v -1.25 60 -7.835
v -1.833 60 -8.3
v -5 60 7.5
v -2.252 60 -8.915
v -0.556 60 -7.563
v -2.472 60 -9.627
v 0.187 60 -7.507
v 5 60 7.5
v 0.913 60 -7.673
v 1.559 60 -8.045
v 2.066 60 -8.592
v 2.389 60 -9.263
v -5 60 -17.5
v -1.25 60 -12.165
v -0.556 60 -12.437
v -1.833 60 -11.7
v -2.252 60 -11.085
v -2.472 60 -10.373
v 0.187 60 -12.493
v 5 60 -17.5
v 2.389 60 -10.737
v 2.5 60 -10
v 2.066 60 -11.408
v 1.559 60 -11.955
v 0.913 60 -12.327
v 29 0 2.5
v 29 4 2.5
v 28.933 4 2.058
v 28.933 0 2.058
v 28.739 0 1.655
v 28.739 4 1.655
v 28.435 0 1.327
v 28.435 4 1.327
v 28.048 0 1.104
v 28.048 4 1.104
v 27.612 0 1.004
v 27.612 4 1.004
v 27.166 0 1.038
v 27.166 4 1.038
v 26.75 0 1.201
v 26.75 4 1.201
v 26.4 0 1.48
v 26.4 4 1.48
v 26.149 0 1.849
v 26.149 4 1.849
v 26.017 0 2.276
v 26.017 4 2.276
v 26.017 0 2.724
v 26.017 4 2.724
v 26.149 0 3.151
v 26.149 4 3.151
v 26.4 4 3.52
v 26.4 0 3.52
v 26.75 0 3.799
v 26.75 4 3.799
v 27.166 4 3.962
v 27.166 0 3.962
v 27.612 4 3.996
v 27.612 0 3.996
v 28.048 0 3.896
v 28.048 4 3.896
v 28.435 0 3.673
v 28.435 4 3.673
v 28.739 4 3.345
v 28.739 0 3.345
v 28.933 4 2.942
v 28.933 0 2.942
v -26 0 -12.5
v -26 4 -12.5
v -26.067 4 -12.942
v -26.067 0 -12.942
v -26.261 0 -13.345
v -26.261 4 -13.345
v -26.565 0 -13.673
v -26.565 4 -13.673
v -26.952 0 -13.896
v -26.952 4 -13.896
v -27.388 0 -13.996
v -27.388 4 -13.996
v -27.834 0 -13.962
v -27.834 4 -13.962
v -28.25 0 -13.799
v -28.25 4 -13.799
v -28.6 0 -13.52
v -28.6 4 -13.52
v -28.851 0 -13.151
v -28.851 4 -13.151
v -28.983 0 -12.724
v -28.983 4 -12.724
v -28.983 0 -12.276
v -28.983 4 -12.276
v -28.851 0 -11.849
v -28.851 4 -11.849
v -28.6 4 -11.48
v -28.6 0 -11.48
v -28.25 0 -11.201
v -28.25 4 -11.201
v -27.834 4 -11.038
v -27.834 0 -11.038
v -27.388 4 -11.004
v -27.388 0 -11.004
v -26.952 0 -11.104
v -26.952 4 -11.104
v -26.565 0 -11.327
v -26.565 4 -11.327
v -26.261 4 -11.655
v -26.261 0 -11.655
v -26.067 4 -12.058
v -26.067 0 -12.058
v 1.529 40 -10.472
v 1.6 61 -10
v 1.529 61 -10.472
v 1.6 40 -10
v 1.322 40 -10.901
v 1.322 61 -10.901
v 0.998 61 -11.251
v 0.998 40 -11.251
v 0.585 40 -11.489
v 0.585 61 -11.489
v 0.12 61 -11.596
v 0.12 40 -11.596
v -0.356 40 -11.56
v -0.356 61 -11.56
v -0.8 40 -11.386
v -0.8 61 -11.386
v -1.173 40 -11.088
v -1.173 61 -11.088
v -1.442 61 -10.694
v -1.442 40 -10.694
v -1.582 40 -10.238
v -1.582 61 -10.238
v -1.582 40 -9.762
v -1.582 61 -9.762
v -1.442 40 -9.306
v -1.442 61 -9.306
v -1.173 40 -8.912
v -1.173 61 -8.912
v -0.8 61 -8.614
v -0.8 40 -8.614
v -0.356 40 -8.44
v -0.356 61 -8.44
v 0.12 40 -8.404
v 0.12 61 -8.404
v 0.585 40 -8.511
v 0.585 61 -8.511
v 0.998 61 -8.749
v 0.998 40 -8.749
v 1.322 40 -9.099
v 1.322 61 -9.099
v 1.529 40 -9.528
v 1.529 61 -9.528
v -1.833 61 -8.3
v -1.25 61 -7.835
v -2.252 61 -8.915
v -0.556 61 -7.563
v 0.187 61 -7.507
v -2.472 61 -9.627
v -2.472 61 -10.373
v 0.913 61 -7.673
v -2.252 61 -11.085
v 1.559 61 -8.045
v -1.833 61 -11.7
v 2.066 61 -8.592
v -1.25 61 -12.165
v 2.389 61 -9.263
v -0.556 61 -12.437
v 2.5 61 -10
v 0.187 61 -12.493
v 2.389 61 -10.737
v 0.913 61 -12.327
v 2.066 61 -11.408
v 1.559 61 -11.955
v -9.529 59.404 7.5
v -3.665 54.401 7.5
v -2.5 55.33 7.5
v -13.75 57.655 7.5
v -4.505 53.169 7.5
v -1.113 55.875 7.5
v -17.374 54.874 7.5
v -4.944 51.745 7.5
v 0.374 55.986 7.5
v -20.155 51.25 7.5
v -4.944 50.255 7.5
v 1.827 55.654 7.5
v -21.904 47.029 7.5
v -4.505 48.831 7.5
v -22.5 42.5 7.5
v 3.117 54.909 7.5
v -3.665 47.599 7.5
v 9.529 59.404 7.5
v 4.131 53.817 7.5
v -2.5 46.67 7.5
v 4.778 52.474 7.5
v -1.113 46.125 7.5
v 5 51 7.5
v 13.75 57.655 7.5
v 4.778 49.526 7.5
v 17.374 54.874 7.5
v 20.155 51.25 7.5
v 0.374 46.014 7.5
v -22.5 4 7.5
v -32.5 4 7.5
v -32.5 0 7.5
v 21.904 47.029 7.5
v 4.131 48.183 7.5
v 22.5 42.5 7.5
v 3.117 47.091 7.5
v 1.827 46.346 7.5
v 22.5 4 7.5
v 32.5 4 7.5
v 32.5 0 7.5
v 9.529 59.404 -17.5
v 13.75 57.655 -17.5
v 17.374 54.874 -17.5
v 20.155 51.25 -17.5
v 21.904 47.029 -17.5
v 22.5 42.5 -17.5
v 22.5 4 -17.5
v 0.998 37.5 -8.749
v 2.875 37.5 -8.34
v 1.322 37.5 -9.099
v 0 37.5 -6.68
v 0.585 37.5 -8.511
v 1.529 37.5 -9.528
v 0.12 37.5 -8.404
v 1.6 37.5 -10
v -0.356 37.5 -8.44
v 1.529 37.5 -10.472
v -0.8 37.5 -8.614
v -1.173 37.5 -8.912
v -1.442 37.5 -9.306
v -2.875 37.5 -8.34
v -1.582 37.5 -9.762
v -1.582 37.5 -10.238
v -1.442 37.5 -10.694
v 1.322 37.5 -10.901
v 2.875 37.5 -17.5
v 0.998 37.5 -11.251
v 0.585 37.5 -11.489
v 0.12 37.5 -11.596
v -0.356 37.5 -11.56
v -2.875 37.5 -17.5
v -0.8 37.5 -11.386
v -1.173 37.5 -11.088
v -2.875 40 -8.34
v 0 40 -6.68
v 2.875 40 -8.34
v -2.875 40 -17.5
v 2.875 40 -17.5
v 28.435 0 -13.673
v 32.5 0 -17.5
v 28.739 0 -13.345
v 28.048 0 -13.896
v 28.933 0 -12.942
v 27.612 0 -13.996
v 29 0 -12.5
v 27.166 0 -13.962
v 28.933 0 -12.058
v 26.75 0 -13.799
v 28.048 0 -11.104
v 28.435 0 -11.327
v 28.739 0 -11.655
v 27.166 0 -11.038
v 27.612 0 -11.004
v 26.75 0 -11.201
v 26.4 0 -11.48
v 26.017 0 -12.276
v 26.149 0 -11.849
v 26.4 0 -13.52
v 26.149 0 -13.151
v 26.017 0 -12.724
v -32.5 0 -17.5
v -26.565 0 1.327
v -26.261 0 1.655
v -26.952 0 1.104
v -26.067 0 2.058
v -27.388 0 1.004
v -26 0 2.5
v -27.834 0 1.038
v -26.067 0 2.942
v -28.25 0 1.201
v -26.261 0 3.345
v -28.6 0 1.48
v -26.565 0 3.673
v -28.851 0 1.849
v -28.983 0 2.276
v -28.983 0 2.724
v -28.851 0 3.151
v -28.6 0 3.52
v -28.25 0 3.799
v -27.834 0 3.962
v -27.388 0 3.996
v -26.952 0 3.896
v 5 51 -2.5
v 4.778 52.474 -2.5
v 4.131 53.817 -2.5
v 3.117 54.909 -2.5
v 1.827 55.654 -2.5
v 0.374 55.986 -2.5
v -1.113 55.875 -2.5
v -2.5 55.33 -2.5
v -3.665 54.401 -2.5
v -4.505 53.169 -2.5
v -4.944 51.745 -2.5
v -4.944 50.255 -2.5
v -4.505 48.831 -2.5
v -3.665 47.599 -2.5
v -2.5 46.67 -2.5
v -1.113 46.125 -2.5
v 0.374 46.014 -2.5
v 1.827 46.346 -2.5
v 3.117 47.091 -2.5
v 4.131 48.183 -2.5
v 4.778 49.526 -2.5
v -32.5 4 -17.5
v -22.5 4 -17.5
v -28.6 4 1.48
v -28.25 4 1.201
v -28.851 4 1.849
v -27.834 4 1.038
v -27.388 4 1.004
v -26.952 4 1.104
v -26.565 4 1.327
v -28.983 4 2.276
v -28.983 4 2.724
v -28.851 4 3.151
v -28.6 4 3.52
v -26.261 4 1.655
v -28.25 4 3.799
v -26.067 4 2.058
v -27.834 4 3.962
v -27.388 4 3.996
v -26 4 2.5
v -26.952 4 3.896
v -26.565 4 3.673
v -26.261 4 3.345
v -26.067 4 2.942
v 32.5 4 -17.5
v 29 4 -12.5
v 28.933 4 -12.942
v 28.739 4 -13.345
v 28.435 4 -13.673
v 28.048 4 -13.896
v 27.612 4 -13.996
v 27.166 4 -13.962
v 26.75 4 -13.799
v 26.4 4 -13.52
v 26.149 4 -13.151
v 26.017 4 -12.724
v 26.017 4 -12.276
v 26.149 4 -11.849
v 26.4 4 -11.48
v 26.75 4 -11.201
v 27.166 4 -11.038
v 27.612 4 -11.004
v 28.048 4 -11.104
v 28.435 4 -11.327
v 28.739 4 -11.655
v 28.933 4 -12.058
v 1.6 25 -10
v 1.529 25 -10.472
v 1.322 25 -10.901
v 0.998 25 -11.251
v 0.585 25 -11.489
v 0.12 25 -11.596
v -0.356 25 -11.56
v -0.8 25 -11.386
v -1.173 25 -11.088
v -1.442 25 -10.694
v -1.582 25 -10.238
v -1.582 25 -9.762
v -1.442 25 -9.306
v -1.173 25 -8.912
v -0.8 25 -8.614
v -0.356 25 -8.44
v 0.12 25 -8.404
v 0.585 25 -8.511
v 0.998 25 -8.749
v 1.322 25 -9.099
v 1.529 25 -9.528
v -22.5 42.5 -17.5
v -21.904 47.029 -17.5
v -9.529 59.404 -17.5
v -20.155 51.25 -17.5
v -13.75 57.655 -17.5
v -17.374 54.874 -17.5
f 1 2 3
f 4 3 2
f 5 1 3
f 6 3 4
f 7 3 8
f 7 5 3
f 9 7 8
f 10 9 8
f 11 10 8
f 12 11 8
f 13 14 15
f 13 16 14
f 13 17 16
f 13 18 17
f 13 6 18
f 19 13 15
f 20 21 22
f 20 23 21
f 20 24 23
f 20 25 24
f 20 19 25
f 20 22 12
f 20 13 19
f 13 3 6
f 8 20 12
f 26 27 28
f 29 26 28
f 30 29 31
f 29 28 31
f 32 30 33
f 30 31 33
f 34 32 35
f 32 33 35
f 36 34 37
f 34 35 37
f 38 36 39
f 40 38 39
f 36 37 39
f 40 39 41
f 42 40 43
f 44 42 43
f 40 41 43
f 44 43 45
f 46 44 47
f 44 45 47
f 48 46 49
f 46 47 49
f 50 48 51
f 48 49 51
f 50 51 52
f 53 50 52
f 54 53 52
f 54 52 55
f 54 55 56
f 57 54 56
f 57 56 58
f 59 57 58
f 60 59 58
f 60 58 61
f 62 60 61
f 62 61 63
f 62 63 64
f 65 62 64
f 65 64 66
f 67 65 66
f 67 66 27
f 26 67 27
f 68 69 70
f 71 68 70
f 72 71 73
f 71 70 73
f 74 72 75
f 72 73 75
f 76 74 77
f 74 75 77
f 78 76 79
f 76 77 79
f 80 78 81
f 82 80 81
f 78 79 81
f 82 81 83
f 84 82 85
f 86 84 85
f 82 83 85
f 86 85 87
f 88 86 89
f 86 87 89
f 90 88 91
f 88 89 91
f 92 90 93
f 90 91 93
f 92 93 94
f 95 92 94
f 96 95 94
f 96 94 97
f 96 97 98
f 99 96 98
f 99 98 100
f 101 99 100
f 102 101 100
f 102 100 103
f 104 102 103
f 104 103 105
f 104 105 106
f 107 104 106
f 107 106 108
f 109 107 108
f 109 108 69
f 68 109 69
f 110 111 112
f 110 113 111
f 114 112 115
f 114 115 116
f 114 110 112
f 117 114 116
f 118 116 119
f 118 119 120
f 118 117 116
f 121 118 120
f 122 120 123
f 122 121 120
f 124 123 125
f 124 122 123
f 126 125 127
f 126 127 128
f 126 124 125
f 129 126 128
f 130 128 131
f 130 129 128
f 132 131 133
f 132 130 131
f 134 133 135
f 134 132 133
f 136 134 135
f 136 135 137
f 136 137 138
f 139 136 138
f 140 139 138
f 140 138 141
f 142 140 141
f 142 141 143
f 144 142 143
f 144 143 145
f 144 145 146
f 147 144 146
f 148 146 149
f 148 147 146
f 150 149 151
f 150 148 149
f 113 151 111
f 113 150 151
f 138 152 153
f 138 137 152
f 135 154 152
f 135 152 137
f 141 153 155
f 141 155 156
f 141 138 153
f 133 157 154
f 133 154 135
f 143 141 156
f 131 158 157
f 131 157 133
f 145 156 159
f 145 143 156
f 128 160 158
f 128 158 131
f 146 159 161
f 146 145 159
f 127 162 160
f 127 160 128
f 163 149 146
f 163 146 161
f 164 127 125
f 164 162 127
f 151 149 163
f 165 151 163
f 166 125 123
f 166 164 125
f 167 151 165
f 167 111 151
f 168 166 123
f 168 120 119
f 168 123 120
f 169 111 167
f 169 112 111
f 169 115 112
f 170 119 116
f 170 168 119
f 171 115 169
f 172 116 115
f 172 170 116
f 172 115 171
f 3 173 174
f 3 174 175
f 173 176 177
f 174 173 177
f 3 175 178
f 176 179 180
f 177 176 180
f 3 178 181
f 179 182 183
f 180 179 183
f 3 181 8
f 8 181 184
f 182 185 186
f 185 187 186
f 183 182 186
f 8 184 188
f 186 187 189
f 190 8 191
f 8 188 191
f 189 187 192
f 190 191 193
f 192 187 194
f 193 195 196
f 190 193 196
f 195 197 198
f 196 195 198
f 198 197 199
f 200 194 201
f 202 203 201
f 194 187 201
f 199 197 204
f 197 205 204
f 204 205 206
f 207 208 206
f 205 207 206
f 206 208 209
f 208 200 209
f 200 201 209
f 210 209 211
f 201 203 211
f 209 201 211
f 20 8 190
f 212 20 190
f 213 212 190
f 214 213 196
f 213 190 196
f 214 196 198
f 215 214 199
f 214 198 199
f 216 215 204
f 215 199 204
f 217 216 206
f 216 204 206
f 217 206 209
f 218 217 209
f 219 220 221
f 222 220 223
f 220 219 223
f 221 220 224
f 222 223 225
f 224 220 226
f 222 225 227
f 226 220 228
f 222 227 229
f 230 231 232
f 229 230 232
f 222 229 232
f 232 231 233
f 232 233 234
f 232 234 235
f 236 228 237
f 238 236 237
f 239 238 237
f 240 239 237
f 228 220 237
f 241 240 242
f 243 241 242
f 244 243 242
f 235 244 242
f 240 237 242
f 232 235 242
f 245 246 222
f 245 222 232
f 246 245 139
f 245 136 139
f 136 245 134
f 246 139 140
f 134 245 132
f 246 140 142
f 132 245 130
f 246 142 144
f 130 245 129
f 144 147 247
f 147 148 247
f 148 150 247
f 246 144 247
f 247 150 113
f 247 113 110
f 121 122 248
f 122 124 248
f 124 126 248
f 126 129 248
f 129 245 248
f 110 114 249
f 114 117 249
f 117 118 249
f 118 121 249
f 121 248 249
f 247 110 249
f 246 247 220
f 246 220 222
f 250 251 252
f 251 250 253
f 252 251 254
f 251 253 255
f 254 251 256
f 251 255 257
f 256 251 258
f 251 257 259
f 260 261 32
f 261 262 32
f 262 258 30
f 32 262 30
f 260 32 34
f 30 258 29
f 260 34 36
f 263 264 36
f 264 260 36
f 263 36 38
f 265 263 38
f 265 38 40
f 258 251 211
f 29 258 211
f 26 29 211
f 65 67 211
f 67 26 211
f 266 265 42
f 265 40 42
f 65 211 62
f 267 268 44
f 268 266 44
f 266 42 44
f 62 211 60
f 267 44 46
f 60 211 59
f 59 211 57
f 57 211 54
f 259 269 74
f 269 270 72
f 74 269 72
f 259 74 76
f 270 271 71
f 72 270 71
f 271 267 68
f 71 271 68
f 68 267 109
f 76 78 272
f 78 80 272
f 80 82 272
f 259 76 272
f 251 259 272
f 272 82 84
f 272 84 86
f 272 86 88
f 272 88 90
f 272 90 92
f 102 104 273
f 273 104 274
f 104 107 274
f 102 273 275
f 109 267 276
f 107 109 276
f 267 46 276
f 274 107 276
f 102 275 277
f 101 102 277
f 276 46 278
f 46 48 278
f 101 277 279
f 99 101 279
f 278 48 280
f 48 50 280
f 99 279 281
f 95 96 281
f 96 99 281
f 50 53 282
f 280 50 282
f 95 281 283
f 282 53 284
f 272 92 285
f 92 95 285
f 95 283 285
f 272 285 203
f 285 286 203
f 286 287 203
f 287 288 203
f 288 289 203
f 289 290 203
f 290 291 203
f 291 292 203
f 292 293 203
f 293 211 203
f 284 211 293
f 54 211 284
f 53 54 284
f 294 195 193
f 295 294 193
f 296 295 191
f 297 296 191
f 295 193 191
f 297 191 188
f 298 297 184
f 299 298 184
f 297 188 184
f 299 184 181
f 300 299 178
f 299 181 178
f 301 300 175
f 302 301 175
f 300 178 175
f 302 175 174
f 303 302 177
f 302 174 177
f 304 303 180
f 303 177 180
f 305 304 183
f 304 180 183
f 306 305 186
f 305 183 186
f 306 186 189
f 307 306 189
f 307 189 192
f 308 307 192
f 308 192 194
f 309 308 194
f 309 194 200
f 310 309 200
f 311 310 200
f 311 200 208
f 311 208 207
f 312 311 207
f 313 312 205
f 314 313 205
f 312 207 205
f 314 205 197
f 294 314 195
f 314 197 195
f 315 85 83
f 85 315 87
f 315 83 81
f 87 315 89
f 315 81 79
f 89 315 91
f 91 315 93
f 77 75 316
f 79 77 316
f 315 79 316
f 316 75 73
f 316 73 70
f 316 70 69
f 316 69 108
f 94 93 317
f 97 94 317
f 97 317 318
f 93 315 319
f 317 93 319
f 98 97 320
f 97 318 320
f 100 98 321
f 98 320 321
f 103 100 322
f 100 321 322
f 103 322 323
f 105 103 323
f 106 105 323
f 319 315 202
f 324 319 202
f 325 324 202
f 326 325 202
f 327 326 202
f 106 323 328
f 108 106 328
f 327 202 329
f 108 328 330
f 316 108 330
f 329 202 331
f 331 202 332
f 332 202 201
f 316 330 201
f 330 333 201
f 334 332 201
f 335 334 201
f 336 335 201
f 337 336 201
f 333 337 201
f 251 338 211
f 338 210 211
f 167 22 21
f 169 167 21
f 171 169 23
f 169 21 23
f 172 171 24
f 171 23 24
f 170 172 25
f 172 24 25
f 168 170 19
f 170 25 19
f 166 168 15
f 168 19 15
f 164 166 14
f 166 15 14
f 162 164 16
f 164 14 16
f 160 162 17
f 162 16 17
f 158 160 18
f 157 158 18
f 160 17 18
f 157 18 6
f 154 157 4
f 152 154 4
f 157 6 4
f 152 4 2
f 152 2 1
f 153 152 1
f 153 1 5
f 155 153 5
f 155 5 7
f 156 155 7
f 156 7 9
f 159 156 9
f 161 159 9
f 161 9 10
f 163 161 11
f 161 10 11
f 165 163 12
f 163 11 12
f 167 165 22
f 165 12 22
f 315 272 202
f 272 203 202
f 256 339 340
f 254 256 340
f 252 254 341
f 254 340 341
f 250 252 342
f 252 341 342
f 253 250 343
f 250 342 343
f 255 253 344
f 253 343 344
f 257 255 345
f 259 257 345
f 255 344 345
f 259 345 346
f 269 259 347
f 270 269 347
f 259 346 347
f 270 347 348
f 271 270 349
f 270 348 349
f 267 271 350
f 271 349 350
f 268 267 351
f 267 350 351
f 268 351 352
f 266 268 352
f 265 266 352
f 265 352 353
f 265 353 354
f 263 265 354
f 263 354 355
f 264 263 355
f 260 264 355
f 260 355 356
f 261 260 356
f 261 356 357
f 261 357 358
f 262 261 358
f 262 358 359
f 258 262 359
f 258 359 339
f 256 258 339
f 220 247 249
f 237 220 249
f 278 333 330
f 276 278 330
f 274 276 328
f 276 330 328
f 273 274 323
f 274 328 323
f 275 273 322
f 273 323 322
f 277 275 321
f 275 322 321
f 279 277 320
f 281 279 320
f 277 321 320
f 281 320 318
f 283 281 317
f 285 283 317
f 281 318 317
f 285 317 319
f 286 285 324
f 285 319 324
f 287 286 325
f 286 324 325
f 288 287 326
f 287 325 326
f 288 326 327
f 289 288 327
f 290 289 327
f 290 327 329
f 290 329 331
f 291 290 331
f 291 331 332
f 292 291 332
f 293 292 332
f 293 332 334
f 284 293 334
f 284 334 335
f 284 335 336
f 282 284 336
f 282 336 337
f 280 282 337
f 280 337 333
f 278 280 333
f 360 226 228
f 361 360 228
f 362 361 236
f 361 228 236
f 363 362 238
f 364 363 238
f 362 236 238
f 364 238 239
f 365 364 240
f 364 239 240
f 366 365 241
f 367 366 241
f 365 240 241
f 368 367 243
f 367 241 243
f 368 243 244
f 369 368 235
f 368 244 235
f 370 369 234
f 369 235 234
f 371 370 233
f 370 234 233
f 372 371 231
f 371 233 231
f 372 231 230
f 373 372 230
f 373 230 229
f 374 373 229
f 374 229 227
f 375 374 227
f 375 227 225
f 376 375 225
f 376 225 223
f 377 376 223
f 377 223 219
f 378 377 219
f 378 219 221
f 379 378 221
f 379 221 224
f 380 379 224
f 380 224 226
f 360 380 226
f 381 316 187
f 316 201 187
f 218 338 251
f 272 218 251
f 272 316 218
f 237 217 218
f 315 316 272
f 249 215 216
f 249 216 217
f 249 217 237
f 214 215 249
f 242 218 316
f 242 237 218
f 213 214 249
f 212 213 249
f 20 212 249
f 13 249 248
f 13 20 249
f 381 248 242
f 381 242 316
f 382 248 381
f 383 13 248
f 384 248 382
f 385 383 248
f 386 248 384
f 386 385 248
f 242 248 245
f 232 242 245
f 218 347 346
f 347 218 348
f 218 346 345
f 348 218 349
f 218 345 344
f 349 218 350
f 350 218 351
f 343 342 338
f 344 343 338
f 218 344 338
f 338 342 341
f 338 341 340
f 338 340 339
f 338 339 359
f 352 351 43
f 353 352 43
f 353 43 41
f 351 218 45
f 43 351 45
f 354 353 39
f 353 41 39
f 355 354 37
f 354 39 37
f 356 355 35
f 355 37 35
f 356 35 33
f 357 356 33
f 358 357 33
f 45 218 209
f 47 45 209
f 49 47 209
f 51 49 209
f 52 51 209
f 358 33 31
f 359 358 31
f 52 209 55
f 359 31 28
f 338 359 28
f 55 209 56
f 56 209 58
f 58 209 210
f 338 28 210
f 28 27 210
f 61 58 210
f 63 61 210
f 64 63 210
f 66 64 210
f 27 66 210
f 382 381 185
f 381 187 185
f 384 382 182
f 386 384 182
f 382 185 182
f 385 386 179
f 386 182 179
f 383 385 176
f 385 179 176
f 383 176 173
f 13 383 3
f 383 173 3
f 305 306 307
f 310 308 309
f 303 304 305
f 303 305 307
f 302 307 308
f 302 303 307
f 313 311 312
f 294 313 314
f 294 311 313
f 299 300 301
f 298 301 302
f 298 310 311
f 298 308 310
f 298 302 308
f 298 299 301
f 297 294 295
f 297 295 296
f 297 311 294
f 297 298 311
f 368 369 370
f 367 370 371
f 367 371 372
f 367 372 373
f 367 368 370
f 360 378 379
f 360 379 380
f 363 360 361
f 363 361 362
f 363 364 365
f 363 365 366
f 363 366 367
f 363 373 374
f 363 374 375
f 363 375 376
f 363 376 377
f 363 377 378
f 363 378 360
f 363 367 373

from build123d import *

# Parameters (mm, degrees)
SKETCH1_W           = 65
SKETCH1_H           = 15
BOSS_EXTRUDE1_DEPTH = 4
SKETCH2_W           = 45
SKETCH2_H           = 15
BOSS_EXTRUDE2_DEPTH = 56
SKETCH3_R           = 5
CUT_EXTRUDE1_DEPTH  = 10
CUT_EXTRUDE5_REACH  = 17
BOSS_EXTRUDE3_DEPTH = 10
CUT_EXTRUDE6_REACH  = 6
SKETCH8_R           = 1.5
CUT_EXTRUDE7_DEPTH  = 22.5
SKETCH10_R          = 1.6
BOSS_EXTRUDE4_DEPTH = 20
SKETCH11_R          = 1.6
CUT_EXTRUDE8_DEPTH  = 35
SKETCH12_R          = 2.5
SKETCH12_R_2        = 1.6
BOSS_EXTRUDE5_DEPTH = 1


with BuildPart() as part:
    # Sketch1 → Boss-Extrude1 (new body)
    with BuildSketch(Plane(origin=(0, 0, 0), x_dir=(1, 0, 0), z_dir=(0, 1, 0))):
        Rectangle(SKETCH1_W, SKETCH1_H)
    extrude(amount=BOSS_EXTRUDE1_DEPTH)

    # Sketch2 → Boss-Extrude2 (add)
    with BuildSketch(Plane(origin=(0, 4, 0), x_dir=(1, 0, 0), z_dir=(0, 1, 0))):
        Rectangle(SKETCH2_W, SKETCH2_H)
    extrude(amount=BOSS_EXTRUDE2_DEPTH)

    # Sketch3 → Cut-Extrude1 (cut)
    with BuildSketch(Plane.XY.offset(7.5)):
        with Locations((0, 51)):
            Circle(SKETCH3_R)
    extrude(amount=-CUT_EXTRUDE1_DEPTH, mode=Mode.SUBTRACT)

    # Sketch6 → Cut-Extrude5 (cut, up to next)
    with BuildSketch(Plane.XY.offset(7.5), mode=Mode.PRIVATE) as cut_extrude5_sk1:
        with BuildLine():
            Line((5, 60), (22.5, 60))
            Line((22.5, 60), (22.5, 42.5))
            ThreePointArc((22.5, 42.5), (17.374368671, 54.874368671), (5, 60))
        make_face()
    cut_extrude5_tool1 = extrude(cut_extrude5_sk1.sketch, amount=-CUT_EXTRUDE5_REACH, mode=Mode.PRIVATE) & part.part
    add(cut_extrude5_tool1.solids().sort_by_distance((18.591061, 56.091061, 7.5))[0], mode=Mode.SUBTRACT)
    # Sketch6 → Cut-Extrude5 (cut, up to next)
    with BuildSketch(Plane.XY.offset(7.5), mode=Mode.PRIVATE) as cut_extrude5_sk2:
        with BuildLine():
            Line((-22.5, 42.5), (-22.5, 60))
            Line((-22.5, 60), (-5, 60))
            ThreePointArc((-5, 60), (-17.374368671, 54.874368671), (-22.5, 42.5))
        make_face()
    cut_extrude5_tool2 = extrude(cut_extrude5_sk2.sketch, amount=-CUT_EXTRUDE5_REACH, mode=Mode.PRIVATE) & part.part
    add(cut_extrude5_tool2.solids().sort_by_distance((-18.591061, 56.091061, 7.5))[0], mode=Mode.SUBTRACT)

    # Sketch7 → Boss-Extrude3 (add)
    with BuildSketch(Plane(origin=(0, 0, -7.5), x_dir=(-1, 0, 0), z_dir=(0, 0, -1))):
        with BuildLine():
            Line((-22.5, 42.5), (-22.5, 4))
            Line((-22.5, 4), (-32.5, 4))
            Line((-32.5, 4), (-32.5, 0))
            Line((-32.5, 0), (32.5, 0))
            Line((32.5, 0), (32.5, 4))
            Line((32.5, 4), (22.5, 4))
            Line((22.5, 4), (22.5, 42.5))
            ThreePointArc((22.5, 42.5), (17.374368671, 54.874368671), (5, 60))
            Line((5, 60), (-5, 60))
            ThreePointArc((-5, 60), (-17.374368671, 54.874368671), (-22.5, 42.5))
        make_face()
    extrude(amount=BOSS_EXTRUDE3_DEPTH)

    # Sketch8 → Cut-Extrude6 (cut, up to next)
    with BuildSketch(Plane(origin=(0, 4, 0), x_dir=(1, 0, 0), z_dir=(0, 1, 0)), mode=Mode.PRIVATE) as cut_extrude6_sk1:
        with Locations((-27.5, -2.5)):
            Circle(SKETCH8_R)
    cut_extrude6_tool1 = extrude(cut_extrude6_sk1.sketch, amount=-CUT_EXTRUDE6_REACH, mode=Mode.PRIVATE) & part.part
    add(cut_extrude6_tool1.solids().sort_by_distance((-27.5, 4, 2.5))[0], mode=Mode.SUBTRACT)
    # Sketch8 → Cut-Extrude6 (cut, up to next)
    with BuildSketch(Plane(origin=(0, 4, 0), x_dir=(1, 0, 0), z_dir=(0, 1, 0)), mode=Mode.PRIVATE) as cut_extrude6_sk2:
        with Locations((-27.5, 12.5)):
            Circle(SKETCH8_R)
    cut_extrude6_tool2 = extrude(cut_extrude6_sk2.sketch, amount=-CUT_EXTRUDE6_REACH, mode=Mode.PRIVATE) & part.part
    add(cut_extrude6_tool2.solids().sort_by_distance((-27.5, 4, -12.5))[0], mode=Mode.SUBTRACT)
    # Sketch8 → Cut-Extrude6 (cut, up to next)
    with BuildSketch(Plane(origin=(0, 4, 0), x_dir=(1, 0, 0), z_dir=(0, 1, 0)), mode=Mode.PRIVATE) as cut_extrude6_sk3:
        with Locations((27.5, 12.5)):
            Circle(SKETCH8_R)
    cut_extrude6_tool3 = extrude(cut_extrude6_sk3.sketch, amount=-CUT_EXTRUDE6_REACH, mode=Mode.PRIVATE) & part.part
    add(cut_extrude6_tool3.solids().sort_by_distance((27.5, 4, -12.5))[0], mode=Mode.SUBTRACT)
    # Sketch8 → Cut-Extrude6 (cut, up to next)
    with BuildSketch(Plane(origin=(0, 4, 0), x_dir=(1, 0, 0), z_dir=(0, 1, 0)), mode=Mode.PRIVATE) as cut_extrude6_sk4:
        with Locations((27.5, -2.5)):
            Circle(SKETCH8_R)
    cut_extrude6_tool4 = extrude(cut_extrude6_sk4.sketch, amount=-CUT_EXTRUDE6_REACH, mode=Mode.PRIVATE) & part.part
    add(cut_extrude6_tool4.solids().sort_by_distance((27.5, 4, 2.5))[0], mode=Mode.SUBTRACT)

    # Sketch9 → Cut-Extrude7 (cut)
    with BuildSketch(Plane(origin=(0, 60, 0), x_dir=(1, 0, 0), z_dir=(0, 1, 0))):
        Polygon((-2.875, 11.659882024), (-2.875, 17.5), (2.875, 17.5), (2.875, 11.659882024), (2.875, 8.340117976), (0, 6.680235952), (-2.875, 8.340117976), align=None)
    extrude(amount=-CUT_EXTRUDE7_DEPTH, mode=Mode.SUBTRACT)

    # Sketch10 → Boss-Extrude4 (add)
    with BuildSketch(Plane(origin=(0, 60, 0), x_dir=(1, 0, 0), z_dir=(0, 1, 0))):
        Polygon((0, 6.680235952), (2.875, 8.340117976), (2.875, 17.5), (-2.875, 17.5), (-2.875, 8.340117976), align=None)
        with Locations((0, 10)):
            Circle(SKETCH10_R, mode=Mode.SUBTRACT)
    extrude(amount=-BOSS_EXTRUDE4_DEPTH)

    # Sketch11 → Cut-Extrude8 (cut)
    with BuildSketch(Plane(origin=(0, 60, 0), x_dir=(1, 0, 0), z_dir=(0, 1, 0))):
        with Locations((0, 10)):
            Circle(SKETCH11_R)
    extrude(amount=-CUT_EXTRUDE8_DEPTH, mode=Mode.SUBTRACT)

    # Sketch12 → Boss-Extrude5 (add)
    with BuildSketch(Plane(origin=(0, 60, 0), x_dir=(1, 0, 0), z_dir=(0, 1, 0))):
        with Locations((0, 10)):
            Circle(SKETCH12_R)
        with Locations((0, 10)):
            Circle(SKETCH12_R_2, mode=Mode.SUBTRACT)
    extrude(amount=BOSS_EXTRUDE5_DEPTH)


solid = part.part
